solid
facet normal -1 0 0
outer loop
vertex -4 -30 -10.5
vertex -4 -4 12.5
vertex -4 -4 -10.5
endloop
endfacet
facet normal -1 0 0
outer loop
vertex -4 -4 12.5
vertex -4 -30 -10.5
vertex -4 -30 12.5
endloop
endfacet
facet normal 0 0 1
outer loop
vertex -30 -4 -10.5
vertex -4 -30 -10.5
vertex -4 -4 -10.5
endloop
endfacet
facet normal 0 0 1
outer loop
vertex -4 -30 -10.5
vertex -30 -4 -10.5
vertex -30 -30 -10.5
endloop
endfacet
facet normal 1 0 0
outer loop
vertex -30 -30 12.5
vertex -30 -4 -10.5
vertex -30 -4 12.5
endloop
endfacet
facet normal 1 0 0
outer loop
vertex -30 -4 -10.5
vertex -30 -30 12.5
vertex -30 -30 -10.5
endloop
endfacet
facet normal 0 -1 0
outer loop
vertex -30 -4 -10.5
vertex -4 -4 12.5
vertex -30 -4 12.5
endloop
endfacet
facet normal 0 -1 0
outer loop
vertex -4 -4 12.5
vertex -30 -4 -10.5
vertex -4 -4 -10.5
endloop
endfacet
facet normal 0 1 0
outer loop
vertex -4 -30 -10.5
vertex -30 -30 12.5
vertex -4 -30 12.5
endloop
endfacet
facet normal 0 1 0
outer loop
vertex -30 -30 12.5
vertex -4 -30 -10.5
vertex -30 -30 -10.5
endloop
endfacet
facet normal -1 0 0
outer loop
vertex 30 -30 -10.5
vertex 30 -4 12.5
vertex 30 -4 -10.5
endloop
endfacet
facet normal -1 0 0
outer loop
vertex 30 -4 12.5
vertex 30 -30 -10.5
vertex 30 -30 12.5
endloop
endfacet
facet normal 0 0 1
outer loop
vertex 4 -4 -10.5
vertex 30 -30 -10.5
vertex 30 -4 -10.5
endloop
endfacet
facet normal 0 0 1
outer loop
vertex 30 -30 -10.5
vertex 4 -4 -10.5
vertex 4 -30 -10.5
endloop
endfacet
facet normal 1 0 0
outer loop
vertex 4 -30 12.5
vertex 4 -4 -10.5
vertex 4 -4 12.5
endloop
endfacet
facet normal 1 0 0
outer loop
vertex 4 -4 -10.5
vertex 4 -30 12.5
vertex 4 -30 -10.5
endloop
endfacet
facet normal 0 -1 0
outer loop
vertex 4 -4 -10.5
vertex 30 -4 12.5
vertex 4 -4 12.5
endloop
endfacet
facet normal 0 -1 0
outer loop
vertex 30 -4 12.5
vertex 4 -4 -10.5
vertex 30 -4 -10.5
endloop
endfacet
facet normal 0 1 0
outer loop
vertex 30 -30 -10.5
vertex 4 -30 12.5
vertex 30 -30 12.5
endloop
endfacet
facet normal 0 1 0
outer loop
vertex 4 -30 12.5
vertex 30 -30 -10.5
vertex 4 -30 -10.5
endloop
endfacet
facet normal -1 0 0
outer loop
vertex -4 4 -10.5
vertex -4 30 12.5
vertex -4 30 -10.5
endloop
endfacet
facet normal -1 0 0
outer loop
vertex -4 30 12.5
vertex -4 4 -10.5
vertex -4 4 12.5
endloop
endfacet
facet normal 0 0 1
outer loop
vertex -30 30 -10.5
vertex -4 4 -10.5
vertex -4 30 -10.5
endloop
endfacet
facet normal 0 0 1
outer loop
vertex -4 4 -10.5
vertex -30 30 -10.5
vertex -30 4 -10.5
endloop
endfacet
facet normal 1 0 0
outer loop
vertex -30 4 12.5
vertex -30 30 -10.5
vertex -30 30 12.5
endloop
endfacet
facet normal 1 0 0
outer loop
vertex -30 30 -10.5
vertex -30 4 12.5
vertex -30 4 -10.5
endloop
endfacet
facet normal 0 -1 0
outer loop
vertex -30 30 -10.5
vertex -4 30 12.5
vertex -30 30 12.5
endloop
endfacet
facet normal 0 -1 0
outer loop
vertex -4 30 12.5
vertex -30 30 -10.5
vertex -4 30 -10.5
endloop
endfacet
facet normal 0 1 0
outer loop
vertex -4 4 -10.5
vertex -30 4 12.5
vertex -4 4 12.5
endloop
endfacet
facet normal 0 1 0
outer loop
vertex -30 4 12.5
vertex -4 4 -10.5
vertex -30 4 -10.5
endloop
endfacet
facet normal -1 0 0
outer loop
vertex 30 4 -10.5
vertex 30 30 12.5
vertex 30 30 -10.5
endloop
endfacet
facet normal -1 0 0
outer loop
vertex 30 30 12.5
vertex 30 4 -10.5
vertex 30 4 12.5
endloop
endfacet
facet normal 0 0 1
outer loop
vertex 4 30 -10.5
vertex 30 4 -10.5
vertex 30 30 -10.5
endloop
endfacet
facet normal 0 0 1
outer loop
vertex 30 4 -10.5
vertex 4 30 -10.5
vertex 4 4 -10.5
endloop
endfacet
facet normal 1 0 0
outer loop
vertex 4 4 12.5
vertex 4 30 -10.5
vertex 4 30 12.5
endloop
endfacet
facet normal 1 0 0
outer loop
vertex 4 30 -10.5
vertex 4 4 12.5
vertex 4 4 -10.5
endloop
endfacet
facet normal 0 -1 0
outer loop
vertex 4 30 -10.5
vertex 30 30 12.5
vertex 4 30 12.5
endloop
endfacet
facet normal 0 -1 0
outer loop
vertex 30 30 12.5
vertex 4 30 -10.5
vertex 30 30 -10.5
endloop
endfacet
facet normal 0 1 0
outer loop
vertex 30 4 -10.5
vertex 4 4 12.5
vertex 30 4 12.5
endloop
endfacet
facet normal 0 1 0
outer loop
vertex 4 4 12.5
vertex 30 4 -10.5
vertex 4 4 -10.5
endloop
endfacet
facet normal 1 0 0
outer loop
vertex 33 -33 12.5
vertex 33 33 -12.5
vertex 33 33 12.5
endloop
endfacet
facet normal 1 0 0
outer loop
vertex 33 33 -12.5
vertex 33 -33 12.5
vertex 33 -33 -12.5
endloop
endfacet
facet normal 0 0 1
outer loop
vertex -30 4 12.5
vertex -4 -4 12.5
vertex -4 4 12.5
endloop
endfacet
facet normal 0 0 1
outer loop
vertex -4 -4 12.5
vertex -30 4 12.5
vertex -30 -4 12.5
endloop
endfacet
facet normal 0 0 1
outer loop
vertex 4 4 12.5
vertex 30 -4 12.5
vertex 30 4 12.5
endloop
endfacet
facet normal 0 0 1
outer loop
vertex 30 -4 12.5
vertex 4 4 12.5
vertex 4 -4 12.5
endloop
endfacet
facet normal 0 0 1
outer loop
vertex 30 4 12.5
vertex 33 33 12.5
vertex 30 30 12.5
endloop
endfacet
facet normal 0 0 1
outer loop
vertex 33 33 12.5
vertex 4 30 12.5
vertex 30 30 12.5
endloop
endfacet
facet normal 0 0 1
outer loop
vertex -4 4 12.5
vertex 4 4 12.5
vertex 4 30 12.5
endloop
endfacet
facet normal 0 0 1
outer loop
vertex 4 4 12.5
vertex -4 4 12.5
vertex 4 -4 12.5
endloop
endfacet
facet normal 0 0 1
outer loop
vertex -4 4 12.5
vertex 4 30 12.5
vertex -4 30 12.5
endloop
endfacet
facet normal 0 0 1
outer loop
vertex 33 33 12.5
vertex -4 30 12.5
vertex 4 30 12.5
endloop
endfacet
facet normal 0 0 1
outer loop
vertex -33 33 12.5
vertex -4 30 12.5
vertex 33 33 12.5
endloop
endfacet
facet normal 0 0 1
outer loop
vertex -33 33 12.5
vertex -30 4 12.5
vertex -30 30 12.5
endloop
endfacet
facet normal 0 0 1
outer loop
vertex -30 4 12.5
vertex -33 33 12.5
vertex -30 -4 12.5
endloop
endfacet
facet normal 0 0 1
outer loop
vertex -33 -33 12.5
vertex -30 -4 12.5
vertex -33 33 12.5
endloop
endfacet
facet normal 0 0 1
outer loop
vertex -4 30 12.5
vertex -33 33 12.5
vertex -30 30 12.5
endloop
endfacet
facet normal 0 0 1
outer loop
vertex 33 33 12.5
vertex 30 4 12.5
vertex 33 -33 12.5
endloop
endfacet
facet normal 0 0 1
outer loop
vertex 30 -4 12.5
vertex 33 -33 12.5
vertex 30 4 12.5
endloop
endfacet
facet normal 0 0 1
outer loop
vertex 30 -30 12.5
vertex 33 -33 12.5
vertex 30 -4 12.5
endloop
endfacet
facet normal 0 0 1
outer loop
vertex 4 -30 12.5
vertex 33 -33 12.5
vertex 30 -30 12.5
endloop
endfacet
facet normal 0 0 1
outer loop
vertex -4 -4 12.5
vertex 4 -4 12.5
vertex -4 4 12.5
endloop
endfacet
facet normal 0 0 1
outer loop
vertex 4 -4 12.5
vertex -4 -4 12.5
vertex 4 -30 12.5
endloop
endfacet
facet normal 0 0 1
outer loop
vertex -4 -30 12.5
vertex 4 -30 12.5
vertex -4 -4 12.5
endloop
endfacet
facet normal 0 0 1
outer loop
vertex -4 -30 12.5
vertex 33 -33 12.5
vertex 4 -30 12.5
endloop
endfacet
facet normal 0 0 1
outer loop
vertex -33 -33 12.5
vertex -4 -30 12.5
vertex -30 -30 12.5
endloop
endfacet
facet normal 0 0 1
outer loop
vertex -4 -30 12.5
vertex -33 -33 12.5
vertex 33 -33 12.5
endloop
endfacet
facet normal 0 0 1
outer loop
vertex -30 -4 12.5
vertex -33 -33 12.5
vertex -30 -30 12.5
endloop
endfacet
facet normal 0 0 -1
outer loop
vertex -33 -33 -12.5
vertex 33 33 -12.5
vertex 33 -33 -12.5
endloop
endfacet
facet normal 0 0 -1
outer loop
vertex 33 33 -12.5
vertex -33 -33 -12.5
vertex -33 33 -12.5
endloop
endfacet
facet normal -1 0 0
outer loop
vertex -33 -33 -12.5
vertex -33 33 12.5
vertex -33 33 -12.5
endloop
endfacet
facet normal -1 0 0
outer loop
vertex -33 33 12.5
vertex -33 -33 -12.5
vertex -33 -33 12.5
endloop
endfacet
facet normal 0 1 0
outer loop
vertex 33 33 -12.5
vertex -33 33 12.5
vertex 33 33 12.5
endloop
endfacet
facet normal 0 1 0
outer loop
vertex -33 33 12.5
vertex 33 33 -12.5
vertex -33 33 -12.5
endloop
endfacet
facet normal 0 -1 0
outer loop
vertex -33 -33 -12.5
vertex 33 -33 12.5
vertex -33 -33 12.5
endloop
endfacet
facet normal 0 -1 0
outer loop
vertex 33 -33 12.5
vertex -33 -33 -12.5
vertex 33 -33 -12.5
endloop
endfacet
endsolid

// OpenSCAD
$fn = 32;

// ----------------------------------------------------------------------
// Pocket plate 66 x 66 x 25
// 2 x 2 pockets 26 mm square, 23 mm deep
// ----------------------------------------------------------------------

// --- parameters (mm) ---
thickness = 25;  // plate thickness
floor_t = 2;     // material left under each pocket
pocket = 26;     // pocket side length
pitch_x = 34;    // pocket pitch along X
pitch_y = 34;    // pocket pitch along Y
cols = 2;        // pockets per row
rows = 2;        // rows of pockets

// --- derived feature positions (mm) ---
depth = thickness - floor_t;        // = 23   pocket depth, down to the floor
span_x = (cols - 1) * pitch_x;      // = 34   distance between outer pockets
span_y = (rows - 1) * pitch_y;      // = 34   distance between outer pocket rows
origin_x = -span_x / 2;             // = -17   X of the first pocket
origin_y = -span_y / 2;             // = -17   Y of the first pocket
plate = [span_x + pocket + 6, span_y + pocket + 6, thickness];  // = [66, 66, 25]   overall size: pockets plus 3 mm of wall on each side
feature_centers = [
  [origin_x + 0 * pitch_x, origin_y + 0 * pitch_y],
  [origin_x + 1 * pitch_x, origin_y + 0 * pitch_y],
  [origin_x + 0 * pitch_x, origin_y + 1 * pitch_y],
  [origin_x + 1 * pitch_x, origin_y + 1 * pitch_y]
];   // pocket centres, used verbatim by the cutter loop

// plate outline, then one pocket per centre in feature_centers
difference() {
  cube(plate, center = true);
  for (centre = feature_centers)
    translate([centre[0] - pocket / 2, centre[1] - pocket / 2, plate[2] / 2 - depth])
      cube([pocket, pocket, depth + 1]);  // centred on the declared pocket centre
}
